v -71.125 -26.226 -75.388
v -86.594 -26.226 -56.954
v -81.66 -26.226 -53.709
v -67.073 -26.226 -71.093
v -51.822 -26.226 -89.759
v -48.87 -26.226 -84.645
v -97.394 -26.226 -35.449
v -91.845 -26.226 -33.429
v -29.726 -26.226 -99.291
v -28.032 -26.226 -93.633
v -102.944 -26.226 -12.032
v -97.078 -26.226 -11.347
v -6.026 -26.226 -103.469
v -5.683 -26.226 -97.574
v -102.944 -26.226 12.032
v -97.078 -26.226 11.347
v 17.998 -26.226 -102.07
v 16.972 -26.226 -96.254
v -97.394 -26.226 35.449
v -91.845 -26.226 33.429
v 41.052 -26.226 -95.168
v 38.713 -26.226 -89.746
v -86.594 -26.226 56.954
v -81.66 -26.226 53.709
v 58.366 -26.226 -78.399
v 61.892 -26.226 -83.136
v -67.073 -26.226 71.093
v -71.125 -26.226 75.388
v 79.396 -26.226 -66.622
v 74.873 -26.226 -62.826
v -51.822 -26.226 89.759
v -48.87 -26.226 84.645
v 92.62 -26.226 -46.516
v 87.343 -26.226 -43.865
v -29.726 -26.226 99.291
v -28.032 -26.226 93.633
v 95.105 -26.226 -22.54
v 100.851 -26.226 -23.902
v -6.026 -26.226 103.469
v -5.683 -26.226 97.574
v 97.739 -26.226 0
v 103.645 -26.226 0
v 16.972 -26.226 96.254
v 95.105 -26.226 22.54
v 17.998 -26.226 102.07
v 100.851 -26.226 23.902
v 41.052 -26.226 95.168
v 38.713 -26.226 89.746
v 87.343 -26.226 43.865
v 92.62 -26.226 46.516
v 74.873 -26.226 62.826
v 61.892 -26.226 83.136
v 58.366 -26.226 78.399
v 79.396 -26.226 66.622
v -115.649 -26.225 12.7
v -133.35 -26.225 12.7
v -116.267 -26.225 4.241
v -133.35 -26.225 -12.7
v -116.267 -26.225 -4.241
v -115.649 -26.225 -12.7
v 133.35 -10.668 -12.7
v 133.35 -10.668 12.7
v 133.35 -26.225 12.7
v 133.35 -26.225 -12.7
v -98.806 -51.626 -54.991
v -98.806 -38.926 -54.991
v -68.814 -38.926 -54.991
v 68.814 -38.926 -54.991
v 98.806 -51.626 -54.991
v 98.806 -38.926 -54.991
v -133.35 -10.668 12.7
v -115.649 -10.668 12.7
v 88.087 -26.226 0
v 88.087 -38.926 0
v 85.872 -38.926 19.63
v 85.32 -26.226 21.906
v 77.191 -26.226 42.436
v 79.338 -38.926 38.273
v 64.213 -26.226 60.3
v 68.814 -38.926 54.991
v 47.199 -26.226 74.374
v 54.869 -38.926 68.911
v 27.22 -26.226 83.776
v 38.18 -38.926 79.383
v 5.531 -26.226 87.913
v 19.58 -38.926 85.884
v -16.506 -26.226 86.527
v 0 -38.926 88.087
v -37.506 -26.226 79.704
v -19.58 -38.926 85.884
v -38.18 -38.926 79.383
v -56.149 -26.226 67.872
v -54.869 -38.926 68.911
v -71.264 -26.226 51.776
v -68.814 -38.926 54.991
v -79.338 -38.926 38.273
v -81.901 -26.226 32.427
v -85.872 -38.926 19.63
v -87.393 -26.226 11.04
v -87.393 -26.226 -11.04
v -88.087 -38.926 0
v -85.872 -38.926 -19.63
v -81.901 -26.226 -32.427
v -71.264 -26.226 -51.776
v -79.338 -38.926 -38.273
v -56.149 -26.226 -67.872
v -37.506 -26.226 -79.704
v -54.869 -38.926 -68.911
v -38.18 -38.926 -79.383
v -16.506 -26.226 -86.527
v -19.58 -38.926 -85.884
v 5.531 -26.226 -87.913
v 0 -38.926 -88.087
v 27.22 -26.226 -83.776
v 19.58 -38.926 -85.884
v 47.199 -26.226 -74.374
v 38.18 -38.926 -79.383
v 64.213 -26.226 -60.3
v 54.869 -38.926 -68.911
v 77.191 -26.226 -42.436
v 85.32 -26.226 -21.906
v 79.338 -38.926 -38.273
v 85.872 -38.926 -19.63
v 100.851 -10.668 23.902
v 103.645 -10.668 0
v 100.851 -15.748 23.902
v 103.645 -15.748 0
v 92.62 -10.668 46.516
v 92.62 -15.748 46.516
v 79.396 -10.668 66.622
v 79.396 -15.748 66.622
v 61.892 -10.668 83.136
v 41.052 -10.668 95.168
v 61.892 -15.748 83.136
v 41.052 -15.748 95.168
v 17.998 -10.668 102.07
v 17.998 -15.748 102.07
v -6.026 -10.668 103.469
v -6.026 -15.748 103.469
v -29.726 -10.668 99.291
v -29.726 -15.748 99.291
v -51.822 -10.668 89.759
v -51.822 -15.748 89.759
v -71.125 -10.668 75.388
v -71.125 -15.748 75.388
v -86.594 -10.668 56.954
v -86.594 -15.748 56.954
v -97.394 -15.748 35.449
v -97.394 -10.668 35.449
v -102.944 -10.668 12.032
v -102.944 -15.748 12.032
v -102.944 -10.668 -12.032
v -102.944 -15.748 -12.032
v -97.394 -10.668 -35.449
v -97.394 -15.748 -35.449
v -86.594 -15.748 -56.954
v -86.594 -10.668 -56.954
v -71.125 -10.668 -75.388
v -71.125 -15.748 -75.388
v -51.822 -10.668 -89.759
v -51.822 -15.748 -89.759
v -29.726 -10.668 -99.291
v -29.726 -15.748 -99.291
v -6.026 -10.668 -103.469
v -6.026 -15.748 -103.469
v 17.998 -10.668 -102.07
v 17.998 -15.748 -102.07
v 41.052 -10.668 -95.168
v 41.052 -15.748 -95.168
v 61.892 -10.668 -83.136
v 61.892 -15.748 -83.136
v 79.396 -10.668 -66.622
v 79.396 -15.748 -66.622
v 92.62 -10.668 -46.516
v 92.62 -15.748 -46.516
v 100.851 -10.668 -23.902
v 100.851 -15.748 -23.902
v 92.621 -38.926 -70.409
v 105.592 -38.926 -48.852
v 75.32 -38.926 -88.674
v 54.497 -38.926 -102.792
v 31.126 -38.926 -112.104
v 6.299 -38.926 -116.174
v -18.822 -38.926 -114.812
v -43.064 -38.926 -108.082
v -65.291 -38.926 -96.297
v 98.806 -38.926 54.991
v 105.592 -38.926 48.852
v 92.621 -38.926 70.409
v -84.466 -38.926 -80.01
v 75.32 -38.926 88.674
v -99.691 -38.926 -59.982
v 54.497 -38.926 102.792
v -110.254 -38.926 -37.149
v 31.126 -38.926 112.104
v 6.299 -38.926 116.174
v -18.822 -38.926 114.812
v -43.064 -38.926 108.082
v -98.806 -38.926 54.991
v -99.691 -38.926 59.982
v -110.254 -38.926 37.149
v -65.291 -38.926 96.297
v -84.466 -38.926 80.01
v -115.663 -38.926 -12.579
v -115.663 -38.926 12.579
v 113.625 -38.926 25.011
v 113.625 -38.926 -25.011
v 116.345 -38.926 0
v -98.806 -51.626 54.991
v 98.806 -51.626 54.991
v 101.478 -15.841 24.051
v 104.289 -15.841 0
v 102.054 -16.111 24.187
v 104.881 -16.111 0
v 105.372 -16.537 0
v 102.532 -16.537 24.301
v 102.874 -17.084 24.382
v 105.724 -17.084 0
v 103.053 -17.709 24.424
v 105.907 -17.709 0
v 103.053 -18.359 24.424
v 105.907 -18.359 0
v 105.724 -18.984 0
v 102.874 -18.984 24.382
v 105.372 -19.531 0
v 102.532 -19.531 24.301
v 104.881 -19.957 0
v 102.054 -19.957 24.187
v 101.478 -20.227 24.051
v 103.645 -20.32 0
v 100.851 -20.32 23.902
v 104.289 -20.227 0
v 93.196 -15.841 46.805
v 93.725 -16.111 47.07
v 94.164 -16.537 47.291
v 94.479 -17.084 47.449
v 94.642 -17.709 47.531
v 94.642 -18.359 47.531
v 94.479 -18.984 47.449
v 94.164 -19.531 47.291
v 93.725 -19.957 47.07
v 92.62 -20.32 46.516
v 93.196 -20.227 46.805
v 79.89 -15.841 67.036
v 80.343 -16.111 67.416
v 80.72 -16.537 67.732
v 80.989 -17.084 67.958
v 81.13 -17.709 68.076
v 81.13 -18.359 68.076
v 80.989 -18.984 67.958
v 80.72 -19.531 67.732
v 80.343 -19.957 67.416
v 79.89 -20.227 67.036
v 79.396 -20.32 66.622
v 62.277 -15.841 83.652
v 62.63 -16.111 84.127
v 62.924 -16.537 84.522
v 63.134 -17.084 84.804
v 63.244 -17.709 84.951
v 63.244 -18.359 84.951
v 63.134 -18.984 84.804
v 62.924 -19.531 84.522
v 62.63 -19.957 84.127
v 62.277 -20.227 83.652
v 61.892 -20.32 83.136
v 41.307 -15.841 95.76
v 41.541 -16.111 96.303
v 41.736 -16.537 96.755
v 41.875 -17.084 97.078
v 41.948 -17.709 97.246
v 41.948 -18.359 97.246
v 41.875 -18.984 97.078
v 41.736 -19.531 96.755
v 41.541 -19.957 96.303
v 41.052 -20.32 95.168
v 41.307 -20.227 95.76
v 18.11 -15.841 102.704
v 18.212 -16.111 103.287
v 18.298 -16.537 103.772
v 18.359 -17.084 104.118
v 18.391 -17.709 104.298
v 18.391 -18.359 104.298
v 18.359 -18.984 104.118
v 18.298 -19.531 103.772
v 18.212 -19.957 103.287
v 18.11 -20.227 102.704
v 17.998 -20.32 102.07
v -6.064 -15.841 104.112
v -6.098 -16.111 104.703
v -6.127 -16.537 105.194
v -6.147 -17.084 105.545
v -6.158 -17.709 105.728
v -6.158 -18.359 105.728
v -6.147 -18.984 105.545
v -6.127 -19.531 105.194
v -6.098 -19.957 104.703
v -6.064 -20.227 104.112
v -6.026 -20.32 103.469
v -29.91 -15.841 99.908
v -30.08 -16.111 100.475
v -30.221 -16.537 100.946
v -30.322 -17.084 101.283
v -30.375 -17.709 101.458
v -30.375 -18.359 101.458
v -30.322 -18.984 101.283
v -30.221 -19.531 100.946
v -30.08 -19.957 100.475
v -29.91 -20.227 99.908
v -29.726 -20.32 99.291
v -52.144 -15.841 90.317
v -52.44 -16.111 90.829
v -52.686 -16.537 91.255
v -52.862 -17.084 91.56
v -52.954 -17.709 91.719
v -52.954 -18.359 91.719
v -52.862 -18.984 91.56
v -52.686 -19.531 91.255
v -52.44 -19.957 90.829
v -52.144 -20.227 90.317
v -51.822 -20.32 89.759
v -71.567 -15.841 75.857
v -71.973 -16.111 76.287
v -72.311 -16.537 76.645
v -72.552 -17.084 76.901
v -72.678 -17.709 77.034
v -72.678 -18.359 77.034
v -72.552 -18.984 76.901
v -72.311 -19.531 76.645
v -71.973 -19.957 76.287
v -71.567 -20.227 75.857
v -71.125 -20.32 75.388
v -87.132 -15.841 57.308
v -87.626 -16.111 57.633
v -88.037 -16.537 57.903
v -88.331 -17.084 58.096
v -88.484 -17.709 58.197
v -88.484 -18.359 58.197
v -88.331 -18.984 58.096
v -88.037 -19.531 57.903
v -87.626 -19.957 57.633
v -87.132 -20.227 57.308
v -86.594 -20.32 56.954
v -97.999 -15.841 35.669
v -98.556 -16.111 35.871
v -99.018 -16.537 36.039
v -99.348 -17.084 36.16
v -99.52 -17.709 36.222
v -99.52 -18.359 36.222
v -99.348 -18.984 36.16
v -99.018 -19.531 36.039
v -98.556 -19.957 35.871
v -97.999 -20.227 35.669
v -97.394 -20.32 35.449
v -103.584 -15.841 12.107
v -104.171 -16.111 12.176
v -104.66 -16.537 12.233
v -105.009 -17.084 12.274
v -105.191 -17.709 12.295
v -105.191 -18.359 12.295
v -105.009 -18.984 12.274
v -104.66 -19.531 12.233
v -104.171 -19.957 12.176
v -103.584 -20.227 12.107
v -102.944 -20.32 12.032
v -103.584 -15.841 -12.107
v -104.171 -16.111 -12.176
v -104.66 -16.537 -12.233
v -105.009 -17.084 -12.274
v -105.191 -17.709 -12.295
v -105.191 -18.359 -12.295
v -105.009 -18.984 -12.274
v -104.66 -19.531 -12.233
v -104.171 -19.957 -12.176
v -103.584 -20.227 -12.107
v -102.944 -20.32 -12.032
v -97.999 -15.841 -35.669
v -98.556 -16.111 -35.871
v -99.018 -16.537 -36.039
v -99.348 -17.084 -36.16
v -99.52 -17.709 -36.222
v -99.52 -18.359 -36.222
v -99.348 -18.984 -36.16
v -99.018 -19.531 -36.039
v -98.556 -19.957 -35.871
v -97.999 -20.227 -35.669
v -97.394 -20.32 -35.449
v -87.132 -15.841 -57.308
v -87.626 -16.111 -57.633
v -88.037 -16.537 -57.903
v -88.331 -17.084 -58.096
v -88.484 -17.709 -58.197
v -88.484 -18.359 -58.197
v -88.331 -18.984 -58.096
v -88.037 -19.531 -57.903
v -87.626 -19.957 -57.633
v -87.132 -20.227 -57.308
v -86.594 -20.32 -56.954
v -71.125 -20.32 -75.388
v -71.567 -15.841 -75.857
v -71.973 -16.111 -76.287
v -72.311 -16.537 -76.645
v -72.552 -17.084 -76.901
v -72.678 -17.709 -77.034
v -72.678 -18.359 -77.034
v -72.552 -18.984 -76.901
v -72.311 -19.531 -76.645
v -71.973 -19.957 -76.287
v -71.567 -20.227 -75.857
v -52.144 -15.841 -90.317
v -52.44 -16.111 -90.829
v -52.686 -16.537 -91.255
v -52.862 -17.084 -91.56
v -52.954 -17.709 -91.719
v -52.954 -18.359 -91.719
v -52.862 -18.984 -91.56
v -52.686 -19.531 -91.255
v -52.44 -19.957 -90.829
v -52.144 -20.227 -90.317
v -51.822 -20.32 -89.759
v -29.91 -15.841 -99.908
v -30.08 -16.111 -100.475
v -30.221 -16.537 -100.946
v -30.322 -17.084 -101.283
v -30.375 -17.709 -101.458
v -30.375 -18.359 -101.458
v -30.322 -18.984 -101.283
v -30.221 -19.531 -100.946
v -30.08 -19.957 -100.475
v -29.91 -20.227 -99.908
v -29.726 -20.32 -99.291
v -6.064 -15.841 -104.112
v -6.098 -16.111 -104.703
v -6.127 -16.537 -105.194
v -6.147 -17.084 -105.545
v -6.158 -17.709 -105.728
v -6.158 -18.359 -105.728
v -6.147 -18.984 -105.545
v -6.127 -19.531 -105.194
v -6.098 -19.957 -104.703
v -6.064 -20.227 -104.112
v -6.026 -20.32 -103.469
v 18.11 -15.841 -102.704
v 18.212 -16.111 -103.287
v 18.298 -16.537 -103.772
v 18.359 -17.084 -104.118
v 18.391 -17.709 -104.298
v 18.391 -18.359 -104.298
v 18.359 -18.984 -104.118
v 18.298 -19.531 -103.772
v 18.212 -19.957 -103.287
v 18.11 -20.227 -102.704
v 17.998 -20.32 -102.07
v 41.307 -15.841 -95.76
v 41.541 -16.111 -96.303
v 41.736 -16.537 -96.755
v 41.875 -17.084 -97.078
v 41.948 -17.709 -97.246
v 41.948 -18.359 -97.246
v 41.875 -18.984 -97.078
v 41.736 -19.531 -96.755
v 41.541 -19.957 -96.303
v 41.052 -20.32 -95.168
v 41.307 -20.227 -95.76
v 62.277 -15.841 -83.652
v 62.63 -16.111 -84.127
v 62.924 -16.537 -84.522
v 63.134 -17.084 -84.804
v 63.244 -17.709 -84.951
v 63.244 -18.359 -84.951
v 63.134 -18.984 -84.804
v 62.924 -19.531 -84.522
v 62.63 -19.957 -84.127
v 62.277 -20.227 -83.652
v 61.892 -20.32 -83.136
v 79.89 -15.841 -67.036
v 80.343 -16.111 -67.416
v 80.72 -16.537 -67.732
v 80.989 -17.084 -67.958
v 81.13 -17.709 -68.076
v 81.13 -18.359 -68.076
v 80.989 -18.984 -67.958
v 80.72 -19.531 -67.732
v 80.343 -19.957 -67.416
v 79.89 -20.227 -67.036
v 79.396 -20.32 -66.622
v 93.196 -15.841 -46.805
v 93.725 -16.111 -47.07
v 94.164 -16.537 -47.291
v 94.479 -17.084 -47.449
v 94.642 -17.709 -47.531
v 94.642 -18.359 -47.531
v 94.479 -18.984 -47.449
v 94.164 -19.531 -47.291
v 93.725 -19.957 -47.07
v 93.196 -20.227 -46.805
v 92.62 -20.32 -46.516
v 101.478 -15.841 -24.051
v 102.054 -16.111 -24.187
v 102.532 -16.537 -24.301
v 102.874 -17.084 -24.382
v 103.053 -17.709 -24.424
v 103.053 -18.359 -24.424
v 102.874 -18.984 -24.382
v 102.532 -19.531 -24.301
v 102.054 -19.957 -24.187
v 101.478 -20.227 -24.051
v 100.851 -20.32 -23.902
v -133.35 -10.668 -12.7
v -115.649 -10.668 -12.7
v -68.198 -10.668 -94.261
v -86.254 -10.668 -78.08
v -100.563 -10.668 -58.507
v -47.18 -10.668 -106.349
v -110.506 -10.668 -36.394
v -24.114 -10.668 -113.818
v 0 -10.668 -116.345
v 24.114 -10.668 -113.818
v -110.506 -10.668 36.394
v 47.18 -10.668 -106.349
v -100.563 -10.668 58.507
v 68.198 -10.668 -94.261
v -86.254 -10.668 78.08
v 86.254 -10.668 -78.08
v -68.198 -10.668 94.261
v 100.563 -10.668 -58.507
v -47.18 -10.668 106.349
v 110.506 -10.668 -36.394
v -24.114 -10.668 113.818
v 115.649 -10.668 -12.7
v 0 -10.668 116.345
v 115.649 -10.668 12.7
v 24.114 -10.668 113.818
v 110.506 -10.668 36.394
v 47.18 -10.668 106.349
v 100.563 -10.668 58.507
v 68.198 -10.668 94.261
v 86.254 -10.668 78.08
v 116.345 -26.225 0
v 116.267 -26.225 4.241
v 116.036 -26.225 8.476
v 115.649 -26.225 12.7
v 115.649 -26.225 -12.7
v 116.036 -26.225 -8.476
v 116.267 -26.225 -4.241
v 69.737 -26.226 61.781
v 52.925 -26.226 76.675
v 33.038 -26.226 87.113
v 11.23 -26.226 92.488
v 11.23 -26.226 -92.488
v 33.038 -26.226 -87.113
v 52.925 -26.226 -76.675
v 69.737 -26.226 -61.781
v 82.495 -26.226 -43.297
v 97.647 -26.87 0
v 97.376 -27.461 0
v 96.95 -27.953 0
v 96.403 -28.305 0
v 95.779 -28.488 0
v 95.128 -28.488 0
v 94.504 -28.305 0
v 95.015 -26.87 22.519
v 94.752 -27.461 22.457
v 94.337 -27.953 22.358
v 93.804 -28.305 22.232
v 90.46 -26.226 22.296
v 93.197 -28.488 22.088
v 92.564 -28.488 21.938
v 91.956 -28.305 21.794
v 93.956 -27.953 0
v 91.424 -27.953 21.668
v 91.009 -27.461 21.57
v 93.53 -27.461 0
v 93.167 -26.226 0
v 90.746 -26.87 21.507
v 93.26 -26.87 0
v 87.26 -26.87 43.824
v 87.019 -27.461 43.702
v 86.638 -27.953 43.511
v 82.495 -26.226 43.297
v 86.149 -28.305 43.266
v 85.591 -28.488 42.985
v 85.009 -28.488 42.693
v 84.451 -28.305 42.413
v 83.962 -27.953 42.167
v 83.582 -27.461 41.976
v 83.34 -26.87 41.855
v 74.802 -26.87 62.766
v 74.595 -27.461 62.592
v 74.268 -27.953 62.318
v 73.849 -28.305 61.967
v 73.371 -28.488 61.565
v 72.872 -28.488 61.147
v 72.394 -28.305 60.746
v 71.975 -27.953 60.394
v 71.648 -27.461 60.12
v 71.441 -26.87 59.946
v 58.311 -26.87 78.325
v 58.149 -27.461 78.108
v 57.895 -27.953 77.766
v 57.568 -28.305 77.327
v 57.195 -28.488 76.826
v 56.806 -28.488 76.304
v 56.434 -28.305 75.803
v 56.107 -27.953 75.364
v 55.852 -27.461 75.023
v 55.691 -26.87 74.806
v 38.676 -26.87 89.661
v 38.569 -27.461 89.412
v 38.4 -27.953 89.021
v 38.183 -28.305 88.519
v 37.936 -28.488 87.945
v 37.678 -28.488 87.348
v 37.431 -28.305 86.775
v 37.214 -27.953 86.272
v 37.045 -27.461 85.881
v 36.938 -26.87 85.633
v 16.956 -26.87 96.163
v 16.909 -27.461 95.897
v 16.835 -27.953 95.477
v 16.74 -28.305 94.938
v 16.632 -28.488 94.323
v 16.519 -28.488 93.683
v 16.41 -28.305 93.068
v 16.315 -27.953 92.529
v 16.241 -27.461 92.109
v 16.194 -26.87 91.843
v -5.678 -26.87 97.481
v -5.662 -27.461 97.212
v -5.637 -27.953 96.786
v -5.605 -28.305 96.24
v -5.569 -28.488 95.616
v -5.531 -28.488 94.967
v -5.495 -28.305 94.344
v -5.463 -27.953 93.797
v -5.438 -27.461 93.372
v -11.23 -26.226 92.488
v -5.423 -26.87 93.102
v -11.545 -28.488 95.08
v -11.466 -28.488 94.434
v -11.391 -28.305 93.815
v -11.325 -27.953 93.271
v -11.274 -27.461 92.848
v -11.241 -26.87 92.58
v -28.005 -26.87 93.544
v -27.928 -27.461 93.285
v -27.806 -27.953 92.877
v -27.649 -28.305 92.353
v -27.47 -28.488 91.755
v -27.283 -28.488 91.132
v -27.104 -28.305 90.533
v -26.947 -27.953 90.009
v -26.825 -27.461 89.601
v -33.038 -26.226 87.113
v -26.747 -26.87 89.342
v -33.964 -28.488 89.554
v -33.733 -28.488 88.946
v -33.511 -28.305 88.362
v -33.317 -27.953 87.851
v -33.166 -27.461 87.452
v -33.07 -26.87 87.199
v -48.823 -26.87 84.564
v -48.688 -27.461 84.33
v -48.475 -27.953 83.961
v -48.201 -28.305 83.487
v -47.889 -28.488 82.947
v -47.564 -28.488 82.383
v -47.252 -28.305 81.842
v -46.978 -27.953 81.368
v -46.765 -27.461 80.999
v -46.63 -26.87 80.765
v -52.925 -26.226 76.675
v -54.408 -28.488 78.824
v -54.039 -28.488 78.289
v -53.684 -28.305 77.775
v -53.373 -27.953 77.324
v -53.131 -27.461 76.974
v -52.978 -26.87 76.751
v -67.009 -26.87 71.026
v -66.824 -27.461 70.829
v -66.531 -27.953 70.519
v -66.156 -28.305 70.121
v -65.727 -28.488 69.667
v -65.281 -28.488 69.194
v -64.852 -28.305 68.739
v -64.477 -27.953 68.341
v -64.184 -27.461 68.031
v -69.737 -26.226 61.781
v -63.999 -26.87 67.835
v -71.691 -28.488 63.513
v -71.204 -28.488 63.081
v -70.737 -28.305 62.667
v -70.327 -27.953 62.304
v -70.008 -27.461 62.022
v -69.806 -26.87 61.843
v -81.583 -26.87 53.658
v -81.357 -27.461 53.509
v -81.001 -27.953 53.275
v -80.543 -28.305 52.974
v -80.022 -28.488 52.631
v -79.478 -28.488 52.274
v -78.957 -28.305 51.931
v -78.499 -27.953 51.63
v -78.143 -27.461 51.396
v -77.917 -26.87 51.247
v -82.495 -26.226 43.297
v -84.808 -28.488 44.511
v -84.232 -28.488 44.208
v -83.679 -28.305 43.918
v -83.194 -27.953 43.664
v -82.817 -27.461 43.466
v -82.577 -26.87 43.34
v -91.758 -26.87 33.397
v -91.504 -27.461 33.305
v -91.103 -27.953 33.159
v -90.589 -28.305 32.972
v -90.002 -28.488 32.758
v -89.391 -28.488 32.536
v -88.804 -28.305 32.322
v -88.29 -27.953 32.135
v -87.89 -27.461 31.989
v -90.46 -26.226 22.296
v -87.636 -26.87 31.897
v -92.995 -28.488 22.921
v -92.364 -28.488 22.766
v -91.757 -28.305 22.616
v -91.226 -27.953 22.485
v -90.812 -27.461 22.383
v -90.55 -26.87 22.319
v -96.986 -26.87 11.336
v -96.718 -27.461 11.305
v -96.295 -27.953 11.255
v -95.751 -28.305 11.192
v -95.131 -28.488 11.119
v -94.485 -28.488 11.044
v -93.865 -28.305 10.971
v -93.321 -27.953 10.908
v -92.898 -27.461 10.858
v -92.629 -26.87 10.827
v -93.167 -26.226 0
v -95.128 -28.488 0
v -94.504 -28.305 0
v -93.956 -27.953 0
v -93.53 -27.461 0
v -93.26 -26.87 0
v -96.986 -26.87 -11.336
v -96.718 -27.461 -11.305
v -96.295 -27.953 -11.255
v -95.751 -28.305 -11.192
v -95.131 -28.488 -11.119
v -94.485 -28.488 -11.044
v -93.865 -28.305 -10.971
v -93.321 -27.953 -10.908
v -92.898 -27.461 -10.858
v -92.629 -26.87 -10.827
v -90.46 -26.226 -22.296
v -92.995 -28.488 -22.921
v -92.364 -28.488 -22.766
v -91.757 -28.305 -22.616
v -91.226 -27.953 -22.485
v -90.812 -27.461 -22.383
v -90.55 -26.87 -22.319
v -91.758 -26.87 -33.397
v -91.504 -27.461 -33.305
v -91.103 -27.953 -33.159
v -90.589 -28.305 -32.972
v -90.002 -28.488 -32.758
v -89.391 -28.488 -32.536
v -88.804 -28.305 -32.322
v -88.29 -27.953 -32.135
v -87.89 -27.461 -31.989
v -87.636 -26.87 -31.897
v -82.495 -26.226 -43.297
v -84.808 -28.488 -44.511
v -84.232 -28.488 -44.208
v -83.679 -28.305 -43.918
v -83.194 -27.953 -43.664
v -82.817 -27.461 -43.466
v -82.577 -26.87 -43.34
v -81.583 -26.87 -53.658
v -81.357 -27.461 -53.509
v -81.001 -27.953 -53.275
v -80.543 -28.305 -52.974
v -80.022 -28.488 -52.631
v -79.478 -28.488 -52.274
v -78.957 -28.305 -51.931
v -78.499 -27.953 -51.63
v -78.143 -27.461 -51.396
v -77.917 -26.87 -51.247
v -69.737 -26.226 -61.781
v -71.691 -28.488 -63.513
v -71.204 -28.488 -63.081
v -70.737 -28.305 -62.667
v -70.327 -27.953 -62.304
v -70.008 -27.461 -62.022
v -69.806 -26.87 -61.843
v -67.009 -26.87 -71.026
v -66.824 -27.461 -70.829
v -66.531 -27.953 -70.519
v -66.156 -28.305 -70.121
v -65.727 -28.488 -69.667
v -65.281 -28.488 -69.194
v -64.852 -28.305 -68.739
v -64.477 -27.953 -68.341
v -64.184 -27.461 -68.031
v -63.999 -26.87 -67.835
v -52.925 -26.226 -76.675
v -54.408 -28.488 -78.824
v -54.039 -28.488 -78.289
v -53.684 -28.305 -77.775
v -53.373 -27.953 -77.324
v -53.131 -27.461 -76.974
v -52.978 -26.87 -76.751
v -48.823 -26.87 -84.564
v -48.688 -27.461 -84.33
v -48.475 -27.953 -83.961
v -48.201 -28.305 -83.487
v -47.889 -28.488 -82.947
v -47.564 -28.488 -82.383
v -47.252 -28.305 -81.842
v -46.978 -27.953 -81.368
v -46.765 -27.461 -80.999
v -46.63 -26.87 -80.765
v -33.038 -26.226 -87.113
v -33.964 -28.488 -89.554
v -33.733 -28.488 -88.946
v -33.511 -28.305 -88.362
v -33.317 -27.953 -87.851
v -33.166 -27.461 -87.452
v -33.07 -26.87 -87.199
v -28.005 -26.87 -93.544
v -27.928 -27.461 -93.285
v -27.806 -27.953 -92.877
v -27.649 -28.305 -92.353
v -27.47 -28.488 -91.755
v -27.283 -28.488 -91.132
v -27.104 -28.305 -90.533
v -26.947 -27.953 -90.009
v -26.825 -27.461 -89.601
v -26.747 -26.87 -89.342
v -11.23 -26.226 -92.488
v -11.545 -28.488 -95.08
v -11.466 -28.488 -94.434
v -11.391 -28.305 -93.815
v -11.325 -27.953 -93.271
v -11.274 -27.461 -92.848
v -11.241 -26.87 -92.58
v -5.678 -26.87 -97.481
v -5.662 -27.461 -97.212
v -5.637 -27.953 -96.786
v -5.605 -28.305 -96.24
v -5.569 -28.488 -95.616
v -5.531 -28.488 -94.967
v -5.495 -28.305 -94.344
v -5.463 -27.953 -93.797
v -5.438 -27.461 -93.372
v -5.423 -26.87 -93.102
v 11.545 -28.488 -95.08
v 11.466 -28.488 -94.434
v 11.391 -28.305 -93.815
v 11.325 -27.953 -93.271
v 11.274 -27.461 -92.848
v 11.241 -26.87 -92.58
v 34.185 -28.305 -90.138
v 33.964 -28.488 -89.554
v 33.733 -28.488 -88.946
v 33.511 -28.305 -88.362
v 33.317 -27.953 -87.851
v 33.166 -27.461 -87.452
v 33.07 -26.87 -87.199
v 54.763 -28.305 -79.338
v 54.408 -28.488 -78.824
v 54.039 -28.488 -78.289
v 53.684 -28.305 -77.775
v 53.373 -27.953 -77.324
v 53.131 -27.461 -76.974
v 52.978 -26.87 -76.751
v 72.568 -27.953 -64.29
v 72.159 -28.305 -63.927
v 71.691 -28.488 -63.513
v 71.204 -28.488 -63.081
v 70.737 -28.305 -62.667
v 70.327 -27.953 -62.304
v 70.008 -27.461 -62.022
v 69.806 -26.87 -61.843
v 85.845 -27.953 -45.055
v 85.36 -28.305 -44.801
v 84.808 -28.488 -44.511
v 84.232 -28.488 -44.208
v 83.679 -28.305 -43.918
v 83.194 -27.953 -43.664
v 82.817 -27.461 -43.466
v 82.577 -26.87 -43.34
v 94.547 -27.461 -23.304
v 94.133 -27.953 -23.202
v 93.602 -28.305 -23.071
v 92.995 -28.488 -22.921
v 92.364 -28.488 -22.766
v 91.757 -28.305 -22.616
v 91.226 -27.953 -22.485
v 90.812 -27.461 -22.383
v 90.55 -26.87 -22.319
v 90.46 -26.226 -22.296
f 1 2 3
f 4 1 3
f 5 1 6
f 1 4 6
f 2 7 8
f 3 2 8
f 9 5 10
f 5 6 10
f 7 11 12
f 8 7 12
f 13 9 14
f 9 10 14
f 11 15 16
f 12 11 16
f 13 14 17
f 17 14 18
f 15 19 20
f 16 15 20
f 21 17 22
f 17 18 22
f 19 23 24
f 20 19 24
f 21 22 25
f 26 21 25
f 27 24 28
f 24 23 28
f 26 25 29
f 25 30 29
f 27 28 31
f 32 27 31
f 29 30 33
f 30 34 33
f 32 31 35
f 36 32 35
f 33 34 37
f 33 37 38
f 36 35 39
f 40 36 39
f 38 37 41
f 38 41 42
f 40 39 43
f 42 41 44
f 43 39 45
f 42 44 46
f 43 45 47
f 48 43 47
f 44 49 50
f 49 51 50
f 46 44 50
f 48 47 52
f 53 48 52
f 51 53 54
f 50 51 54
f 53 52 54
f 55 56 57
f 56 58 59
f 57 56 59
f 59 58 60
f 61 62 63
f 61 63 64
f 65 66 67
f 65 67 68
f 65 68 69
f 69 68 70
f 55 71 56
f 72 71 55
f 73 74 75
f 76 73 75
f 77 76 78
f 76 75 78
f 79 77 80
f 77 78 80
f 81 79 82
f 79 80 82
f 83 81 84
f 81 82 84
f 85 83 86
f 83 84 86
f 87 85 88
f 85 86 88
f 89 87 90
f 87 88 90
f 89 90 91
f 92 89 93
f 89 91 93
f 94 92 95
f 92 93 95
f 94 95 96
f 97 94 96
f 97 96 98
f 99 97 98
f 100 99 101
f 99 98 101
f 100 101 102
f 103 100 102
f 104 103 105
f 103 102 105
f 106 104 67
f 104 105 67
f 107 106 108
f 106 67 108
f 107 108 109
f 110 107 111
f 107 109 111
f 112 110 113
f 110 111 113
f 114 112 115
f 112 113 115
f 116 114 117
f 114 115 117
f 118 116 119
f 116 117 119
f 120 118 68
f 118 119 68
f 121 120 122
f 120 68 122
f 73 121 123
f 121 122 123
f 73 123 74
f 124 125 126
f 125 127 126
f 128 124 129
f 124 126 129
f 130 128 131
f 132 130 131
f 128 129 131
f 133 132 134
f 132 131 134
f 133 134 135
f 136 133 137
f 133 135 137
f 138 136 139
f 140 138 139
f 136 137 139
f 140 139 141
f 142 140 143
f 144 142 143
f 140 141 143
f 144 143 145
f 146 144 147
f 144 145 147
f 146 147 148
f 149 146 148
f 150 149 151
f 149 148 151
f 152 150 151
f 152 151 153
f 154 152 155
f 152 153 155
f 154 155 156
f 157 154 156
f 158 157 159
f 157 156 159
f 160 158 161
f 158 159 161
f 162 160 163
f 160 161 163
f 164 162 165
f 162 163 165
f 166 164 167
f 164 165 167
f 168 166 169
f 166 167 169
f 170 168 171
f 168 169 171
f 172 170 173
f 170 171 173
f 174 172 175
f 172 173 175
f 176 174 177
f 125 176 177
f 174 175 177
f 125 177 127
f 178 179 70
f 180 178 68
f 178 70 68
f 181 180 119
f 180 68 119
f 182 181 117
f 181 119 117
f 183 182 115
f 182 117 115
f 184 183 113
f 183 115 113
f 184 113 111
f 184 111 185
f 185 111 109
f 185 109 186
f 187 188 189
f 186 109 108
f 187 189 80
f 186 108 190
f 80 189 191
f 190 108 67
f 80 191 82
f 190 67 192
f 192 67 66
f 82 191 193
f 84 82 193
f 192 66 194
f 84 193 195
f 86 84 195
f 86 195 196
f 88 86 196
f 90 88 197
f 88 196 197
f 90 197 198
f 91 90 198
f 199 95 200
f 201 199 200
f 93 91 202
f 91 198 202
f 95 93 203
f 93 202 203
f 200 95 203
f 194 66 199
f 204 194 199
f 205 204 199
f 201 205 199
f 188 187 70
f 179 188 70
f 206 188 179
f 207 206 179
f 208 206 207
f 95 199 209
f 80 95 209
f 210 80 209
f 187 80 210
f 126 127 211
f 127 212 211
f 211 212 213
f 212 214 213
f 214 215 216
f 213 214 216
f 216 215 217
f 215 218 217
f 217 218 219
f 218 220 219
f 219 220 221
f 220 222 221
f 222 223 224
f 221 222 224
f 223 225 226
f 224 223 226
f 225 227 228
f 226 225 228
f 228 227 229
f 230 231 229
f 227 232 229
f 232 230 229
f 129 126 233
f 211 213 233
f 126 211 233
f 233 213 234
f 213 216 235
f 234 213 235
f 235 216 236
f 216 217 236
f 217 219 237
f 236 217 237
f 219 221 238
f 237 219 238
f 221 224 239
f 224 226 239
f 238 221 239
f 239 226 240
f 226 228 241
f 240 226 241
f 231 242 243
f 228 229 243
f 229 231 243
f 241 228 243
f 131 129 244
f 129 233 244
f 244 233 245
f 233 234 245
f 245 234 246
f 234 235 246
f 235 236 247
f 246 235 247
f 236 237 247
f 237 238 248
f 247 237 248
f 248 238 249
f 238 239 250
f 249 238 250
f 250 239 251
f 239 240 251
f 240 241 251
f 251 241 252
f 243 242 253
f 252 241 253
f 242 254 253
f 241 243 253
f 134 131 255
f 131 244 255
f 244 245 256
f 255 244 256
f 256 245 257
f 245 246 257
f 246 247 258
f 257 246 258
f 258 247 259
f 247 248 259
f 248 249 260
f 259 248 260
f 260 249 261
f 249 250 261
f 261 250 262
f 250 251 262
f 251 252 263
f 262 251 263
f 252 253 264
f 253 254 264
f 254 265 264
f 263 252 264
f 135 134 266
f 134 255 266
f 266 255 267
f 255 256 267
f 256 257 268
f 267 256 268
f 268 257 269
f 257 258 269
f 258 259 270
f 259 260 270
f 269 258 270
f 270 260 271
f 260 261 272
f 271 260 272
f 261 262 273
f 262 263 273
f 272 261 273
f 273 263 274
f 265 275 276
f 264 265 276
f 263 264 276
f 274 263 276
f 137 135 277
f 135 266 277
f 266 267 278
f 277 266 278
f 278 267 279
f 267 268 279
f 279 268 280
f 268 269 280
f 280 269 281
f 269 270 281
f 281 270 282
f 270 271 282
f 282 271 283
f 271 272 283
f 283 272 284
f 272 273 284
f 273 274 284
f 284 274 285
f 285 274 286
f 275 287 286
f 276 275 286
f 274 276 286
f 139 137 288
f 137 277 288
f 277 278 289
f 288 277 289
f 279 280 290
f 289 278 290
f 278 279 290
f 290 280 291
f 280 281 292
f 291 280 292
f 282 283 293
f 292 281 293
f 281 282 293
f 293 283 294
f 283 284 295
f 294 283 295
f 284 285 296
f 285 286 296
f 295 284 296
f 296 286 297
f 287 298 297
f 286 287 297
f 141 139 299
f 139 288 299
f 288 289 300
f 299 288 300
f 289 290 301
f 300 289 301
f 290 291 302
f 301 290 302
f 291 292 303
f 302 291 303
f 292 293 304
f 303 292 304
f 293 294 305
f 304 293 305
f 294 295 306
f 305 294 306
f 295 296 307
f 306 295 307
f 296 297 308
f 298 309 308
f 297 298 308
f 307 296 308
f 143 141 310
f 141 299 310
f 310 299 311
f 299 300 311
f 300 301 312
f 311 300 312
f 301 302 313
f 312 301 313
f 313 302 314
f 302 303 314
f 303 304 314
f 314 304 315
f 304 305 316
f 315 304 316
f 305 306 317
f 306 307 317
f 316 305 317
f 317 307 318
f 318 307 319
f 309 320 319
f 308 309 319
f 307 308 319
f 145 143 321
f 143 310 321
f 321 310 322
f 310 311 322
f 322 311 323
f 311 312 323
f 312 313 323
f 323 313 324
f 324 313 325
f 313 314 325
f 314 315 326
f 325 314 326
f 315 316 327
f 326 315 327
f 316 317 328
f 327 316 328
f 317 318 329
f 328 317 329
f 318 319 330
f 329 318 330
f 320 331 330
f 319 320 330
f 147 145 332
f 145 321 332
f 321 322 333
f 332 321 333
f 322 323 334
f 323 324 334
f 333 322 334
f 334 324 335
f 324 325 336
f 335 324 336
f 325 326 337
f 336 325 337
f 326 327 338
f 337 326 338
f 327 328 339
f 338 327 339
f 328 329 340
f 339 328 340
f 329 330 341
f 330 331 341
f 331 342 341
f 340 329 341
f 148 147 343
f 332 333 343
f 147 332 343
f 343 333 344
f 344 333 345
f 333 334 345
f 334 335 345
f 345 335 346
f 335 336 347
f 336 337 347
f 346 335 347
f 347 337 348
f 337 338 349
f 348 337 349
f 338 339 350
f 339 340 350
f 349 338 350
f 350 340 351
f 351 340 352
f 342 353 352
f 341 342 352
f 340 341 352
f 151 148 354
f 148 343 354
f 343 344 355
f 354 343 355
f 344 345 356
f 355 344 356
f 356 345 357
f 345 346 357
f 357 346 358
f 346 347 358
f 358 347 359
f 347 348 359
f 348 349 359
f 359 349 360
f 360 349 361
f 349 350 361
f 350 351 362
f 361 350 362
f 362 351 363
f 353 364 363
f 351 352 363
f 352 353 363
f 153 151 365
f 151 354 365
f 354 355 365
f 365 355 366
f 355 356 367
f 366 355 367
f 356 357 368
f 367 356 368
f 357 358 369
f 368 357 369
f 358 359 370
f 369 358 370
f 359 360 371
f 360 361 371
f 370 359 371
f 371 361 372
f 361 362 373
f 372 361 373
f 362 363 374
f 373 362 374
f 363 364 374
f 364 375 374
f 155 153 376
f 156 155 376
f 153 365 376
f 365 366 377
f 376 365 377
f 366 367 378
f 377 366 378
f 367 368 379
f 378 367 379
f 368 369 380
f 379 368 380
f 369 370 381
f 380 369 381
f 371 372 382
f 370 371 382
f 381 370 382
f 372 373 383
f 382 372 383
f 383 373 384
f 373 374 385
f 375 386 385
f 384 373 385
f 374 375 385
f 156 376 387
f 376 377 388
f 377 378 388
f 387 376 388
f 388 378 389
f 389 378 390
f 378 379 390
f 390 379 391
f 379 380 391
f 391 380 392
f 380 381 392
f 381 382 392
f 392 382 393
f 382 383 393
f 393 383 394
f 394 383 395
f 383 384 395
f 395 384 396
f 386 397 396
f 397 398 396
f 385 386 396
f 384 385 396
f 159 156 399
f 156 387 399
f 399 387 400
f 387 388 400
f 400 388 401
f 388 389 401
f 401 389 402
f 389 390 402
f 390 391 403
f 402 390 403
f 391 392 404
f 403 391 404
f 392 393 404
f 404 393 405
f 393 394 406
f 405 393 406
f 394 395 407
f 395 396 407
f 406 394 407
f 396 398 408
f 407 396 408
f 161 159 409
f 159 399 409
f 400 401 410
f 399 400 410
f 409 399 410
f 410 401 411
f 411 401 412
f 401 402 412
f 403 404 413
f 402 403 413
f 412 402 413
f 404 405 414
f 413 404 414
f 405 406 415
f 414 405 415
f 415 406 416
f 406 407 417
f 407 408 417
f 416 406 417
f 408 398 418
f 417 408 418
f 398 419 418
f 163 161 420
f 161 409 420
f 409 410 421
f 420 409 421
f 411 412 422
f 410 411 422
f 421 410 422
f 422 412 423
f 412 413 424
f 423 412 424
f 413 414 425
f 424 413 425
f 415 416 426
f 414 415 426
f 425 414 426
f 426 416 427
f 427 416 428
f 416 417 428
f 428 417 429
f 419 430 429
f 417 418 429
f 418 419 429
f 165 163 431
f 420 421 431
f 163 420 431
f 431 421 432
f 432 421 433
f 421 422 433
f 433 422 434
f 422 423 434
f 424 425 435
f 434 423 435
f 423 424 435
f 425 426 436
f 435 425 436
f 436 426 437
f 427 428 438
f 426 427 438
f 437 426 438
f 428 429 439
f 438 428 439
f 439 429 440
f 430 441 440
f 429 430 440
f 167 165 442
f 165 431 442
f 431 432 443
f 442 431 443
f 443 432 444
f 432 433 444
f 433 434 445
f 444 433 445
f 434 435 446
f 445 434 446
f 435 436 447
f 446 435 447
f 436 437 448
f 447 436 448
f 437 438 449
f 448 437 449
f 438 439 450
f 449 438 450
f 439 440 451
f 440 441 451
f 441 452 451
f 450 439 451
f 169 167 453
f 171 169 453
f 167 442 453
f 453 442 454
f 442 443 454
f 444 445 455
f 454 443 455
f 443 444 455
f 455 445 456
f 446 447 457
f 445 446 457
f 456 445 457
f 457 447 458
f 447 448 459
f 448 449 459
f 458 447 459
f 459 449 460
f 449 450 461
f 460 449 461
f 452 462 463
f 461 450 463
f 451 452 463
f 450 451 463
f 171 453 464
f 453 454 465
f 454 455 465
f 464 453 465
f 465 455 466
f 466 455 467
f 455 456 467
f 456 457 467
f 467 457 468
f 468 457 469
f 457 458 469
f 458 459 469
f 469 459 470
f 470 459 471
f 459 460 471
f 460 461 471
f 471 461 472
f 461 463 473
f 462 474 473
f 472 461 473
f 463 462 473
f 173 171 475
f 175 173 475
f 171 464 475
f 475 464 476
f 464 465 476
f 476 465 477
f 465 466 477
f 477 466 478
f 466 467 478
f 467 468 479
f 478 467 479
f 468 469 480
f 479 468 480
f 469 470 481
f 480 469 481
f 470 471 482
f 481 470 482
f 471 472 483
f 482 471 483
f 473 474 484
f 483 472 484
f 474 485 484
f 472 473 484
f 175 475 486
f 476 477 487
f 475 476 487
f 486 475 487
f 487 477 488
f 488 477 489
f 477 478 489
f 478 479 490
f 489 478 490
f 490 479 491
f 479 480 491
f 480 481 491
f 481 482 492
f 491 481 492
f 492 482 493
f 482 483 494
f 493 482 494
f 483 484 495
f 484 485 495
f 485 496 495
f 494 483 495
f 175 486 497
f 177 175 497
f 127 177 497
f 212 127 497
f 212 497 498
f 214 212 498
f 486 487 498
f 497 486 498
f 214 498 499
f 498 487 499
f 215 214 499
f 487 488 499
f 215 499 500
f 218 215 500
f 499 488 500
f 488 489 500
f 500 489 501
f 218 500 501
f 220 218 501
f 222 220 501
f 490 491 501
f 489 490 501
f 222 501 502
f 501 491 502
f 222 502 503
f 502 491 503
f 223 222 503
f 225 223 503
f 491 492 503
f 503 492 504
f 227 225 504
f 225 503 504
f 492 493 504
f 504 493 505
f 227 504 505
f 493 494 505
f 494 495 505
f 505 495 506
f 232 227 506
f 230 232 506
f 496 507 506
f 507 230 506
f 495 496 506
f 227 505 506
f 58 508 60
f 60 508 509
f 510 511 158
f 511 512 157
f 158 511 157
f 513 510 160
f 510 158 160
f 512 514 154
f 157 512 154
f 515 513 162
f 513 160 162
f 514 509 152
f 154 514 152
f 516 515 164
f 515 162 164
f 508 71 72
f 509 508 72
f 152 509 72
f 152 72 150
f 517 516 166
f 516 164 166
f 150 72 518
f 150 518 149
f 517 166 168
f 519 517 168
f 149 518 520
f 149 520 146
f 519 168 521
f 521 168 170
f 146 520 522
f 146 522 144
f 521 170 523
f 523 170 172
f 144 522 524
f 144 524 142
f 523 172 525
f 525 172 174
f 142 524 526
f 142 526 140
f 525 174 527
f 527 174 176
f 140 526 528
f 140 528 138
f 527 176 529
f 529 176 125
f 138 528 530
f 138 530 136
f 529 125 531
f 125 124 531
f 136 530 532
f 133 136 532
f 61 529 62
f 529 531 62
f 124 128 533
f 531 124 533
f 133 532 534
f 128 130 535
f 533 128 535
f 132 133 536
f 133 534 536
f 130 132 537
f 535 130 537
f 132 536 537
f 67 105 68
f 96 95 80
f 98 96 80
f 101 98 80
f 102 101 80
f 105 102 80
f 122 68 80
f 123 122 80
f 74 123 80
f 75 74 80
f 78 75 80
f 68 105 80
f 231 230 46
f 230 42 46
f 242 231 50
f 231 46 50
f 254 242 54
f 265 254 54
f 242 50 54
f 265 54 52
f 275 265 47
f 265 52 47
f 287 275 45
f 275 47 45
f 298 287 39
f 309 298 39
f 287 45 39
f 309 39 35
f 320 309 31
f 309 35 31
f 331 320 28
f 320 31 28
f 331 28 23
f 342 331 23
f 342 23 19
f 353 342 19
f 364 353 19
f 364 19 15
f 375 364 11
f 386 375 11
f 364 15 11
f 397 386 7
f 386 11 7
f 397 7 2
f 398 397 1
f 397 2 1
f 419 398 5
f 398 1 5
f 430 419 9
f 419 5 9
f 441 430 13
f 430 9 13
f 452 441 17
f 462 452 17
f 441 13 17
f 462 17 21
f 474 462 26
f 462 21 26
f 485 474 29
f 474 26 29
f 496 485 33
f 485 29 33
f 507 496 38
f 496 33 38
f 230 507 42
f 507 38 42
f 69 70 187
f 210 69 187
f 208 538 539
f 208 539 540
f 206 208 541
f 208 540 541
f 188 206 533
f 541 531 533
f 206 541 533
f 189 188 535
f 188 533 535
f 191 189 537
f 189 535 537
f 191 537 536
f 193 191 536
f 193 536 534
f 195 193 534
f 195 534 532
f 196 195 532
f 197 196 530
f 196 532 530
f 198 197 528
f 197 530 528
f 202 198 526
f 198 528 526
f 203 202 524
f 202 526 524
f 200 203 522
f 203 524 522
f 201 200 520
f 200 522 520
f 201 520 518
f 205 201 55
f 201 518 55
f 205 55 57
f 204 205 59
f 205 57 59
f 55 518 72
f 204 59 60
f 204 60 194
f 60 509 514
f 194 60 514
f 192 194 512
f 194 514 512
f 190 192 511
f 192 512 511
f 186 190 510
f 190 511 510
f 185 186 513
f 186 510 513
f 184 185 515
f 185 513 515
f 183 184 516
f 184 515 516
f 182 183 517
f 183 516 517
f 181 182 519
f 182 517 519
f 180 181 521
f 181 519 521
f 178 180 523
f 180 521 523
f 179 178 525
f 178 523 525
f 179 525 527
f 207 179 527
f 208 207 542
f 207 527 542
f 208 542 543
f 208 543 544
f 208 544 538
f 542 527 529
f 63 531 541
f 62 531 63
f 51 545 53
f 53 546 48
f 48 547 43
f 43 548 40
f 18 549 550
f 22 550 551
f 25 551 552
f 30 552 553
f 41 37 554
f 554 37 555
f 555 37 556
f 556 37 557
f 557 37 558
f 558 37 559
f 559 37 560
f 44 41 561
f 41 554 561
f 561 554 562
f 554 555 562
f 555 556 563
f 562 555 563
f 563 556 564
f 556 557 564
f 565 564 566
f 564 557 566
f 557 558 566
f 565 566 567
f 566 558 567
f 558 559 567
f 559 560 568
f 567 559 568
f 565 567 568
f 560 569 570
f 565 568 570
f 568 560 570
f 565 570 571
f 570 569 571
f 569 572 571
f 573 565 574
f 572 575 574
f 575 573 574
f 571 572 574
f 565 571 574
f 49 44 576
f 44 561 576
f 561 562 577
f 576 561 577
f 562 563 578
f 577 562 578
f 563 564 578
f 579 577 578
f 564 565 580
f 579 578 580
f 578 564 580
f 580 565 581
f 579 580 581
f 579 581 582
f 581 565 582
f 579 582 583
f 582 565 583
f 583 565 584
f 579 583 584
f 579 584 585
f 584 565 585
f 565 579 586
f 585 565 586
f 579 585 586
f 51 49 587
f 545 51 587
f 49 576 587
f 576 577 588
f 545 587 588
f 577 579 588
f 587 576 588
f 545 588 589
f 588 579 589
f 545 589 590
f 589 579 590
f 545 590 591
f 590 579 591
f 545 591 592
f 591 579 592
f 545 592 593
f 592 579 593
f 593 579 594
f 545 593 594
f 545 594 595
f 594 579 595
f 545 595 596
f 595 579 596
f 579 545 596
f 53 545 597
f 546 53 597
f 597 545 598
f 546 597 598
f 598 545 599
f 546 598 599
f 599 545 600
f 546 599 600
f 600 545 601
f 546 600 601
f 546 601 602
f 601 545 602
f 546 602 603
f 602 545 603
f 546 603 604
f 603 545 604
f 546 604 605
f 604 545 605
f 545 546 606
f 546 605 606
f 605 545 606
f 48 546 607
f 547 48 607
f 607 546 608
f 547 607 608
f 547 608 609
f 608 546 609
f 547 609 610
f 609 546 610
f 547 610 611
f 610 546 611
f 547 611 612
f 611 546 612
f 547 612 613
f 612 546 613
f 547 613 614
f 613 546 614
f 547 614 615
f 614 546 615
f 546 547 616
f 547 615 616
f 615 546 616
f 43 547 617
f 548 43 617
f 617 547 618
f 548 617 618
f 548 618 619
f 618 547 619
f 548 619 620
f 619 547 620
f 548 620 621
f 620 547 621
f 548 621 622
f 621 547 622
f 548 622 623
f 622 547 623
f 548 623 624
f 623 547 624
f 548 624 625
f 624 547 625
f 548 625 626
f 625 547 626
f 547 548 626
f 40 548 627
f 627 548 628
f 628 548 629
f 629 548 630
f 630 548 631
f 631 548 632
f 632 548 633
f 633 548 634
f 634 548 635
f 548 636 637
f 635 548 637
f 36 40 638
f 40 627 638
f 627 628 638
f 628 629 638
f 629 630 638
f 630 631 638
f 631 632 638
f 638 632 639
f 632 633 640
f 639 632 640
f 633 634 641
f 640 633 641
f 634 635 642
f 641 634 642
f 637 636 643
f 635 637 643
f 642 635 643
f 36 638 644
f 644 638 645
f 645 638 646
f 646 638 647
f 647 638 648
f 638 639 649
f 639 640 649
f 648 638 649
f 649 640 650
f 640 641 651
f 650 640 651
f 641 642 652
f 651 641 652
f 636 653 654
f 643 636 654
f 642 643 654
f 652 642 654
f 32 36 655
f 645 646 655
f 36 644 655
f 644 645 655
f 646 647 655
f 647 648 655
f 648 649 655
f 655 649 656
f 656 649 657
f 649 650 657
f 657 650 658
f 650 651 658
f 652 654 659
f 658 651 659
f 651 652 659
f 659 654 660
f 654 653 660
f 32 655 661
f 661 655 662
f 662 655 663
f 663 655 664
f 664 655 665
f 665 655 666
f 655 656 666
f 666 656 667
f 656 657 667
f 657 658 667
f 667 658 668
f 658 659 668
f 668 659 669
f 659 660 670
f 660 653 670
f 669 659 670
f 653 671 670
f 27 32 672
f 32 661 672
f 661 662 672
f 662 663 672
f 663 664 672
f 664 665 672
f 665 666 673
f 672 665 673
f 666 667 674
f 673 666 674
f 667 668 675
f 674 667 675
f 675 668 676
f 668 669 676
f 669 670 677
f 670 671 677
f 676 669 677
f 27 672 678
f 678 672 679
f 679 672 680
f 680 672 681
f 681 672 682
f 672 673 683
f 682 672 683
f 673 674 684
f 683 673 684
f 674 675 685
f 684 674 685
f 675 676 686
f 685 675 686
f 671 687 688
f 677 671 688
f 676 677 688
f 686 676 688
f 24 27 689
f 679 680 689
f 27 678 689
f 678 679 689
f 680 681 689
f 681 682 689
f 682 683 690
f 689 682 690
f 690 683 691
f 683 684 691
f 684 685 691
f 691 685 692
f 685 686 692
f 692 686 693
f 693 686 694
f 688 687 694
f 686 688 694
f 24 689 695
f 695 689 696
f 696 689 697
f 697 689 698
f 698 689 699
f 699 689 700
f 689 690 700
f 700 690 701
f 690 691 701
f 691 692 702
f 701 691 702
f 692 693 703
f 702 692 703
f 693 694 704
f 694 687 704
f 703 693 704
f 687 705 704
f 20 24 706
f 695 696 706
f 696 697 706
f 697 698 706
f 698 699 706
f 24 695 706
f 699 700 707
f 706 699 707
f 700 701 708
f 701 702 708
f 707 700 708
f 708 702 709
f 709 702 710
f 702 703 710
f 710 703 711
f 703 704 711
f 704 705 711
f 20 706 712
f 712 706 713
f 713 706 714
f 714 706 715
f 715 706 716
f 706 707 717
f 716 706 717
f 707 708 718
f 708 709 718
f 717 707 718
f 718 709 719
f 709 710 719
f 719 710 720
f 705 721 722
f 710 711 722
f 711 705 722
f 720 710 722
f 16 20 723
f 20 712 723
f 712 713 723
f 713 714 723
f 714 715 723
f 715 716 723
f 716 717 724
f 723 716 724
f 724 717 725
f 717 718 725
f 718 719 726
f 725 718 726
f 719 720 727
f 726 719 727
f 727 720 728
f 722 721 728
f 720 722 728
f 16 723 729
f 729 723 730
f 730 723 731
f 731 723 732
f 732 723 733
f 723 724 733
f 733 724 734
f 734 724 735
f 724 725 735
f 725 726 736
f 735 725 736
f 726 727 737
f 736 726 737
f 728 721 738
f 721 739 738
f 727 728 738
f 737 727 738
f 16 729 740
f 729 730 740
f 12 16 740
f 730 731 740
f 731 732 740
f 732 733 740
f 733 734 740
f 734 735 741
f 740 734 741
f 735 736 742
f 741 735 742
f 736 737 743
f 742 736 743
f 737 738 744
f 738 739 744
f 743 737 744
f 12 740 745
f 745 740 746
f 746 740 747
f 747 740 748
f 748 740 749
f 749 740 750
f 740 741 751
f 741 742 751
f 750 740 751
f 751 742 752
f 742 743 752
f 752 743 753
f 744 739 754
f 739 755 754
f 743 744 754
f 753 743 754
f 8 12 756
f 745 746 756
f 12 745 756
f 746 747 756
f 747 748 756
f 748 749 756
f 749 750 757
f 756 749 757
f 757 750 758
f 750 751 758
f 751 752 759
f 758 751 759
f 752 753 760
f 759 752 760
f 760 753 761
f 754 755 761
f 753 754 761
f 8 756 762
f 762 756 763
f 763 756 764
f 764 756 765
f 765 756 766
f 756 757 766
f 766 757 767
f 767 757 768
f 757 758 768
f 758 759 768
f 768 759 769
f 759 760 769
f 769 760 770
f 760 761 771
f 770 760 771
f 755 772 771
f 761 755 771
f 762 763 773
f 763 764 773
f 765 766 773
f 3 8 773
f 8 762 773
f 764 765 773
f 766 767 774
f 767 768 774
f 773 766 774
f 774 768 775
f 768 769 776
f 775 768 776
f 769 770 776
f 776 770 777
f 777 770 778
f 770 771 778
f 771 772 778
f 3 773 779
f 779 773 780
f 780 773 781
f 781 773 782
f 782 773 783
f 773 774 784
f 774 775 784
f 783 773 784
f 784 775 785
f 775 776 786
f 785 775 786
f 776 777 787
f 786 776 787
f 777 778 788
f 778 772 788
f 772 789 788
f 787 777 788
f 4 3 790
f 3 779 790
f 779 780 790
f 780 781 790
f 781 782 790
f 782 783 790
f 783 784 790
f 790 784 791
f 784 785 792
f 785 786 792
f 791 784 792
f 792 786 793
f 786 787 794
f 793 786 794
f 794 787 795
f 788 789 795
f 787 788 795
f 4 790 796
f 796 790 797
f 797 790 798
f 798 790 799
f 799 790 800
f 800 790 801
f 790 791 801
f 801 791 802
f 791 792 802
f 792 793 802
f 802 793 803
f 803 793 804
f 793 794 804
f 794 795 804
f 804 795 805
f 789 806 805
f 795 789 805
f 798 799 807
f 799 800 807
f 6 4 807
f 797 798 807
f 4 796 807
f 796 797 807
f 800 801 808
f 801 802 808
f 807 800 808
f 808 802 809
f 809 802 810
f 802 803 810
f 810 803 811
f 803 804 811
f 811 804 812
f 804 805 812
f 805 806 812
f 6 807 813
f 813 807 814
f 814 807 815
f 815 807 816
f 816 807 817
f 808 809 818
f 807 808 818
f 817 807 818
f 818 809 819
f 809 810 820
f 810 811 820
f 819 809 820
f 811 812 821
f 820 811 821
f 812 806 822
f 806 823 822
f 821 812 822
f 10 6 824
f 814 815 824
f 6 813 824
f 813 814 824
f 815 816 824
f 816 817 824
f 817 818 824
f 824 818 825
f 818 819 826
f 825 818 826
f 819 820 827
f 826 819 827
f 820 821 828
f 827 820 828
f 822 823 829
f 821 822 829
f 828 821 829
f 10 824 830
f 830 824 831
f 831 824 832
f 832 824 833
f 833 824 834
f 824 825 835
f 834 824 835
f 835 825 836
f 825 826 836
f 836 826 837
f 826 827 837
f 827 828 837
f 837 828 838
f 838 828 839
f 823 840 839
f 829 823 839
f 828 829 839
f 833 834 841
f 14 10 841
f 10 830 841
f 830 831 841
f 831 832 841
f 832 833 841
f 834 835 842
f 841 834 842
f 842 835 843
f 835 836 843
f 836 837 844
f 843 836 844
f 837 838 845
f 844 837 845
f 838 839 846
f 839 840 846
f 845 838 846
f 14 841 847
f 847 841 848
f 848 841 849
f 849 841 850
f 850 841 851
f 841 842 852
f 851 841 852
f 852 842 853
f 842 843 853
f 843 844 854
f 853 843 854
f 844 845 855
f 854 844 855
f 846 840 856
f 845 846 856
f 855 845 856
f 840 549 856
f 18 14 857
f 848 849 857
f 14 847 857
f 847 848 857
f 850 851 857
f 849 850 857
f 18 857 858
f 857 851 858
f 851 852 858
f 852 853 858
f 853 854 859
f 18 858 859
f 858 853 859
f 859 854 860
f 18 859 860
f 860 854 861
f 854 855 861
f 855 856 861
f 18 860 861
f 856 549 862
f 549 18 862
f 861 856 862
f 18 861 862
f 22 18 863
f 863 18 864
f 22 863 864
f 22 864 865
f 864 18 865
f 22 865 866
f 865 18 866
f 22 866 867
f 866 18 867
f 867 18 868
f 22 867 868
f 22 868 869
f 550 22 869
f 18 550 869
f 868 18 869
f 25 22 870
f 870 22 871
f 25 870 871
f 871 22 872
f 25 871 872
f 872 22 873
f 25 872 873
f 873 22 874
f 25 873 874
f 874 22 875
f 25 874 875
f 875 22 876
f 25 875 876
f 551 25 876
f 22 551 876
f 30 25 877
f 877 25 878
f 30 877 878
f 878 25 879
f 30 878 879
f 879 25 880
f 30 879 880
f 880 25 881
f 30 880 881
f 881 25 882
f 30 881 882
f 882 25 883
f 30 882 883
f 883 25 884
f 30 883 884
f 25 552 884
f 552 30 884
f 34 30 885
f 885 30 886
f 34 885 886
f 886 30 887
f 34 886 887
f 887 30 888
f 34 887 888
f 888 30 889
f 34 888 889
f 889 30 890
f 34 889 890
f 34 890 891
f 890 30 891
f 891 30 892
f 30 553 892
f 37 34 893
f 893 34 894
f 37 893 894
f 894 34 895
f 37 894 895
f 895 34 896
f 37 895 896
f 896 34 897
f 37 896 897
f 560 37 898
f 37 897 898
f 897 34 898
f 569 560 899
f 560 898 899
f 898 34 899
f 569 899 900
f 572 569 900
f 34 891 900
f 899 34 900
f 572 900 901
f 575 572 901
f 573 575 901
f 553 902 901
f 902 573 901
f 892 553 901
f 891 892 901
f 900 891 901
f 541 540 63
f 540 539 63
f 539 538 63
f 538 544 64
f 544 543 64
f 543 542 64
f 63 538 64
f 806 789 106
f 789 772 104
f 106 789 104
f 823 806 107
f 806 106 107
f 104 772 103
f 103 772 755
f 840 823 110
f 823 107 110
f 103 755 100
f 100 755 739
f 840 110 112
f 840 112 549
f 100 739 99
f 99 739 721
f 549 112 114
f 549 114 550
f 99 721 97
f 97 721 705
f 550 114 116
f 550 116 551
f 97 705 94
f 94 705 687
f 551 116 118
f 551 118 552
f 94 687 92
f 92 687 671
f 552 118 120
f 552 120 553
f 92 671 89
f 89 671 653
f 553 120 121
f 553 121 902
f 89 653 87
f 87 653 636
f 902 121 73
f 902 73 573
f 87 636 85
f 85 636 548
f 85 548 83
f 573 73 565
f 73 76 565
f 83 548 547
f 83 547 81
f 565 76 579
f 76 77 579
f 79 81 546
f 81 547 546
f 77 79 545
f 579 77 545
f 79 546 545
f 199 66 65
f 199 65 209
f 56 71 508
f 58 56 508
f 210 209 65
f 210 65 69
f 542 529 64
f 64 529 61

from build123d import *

# Parameters (mm, degrees)
SKETCH2_W           = 197.612
SKETCH2_H           = 109.982
BOSS_EXTRUDE1_DEPTH = 12.7
SKETCH3_W           = 19.05
SKETCH3_H           = 25.4
BOSS_EXTRUDE2_DEPTH = 15.5575


with BuildPart() as part:
    # Sketch1 → Revolve1 (revolve)
    with BuildSketch(Plane.XY):
        with BuildLine():
            Line((103.6447, -10.668), (103.6447, -15.748))
            ThreePointArc((103.6447, -15.748), (105.9307, -18.034), (103.6447, -20.32))
            Line((103.6447, -20.32), (103.6447, -26.2255))
            Line((103.6447, -26.2255), (97.7392, -26.2255))
            ThreePointArc((97.7392, -26.2255), (95.4532, -28.5115), (93.1672, -26.2255))
            Line((93.1672, -26.2255), (88.0872, -26.2255))
            Line((88.0872, -26.2255), (88.0872, -38.9255))
            Line((88.0872, -38.9255), (116.3447, -38.9255))
            Line((116.3447, -38.9255), (116.3447, -10.668))
            Line((116.3447, -10.668), (103.6447, -10.668))
        make_face()
    revolve(axis=Axis((0, 0, 0), (0, -1, 0)))

    # Sketch2 → Boss-Extrude1 (add)
    with BuildSketch(Plane.XZ.offset(38.9255)):
        Rectangle(SKETCH2_W, SKETCH2_H)
    extrude(amount=BOSS_EXTRUDE1_DEPTH)

    # Sketch3 → Boss-Extrude2 (add)
    with BuildSketch(Plane(origin=(0, -10.668, 0), x_dir=(1, 0, 0), z_dir=(0, 1, 0))):
        with Locations((123.825, 0)):
            Rectangle(SKETCH3_W, SKETCH3_H)
        with Locations((-123.825, 0)):
            Rectangle(SKETCH3_W, SKETCH3_H)
    extrude(amount=-BOSS_EXTRUDE2_DEPTH)


solid = part.part
